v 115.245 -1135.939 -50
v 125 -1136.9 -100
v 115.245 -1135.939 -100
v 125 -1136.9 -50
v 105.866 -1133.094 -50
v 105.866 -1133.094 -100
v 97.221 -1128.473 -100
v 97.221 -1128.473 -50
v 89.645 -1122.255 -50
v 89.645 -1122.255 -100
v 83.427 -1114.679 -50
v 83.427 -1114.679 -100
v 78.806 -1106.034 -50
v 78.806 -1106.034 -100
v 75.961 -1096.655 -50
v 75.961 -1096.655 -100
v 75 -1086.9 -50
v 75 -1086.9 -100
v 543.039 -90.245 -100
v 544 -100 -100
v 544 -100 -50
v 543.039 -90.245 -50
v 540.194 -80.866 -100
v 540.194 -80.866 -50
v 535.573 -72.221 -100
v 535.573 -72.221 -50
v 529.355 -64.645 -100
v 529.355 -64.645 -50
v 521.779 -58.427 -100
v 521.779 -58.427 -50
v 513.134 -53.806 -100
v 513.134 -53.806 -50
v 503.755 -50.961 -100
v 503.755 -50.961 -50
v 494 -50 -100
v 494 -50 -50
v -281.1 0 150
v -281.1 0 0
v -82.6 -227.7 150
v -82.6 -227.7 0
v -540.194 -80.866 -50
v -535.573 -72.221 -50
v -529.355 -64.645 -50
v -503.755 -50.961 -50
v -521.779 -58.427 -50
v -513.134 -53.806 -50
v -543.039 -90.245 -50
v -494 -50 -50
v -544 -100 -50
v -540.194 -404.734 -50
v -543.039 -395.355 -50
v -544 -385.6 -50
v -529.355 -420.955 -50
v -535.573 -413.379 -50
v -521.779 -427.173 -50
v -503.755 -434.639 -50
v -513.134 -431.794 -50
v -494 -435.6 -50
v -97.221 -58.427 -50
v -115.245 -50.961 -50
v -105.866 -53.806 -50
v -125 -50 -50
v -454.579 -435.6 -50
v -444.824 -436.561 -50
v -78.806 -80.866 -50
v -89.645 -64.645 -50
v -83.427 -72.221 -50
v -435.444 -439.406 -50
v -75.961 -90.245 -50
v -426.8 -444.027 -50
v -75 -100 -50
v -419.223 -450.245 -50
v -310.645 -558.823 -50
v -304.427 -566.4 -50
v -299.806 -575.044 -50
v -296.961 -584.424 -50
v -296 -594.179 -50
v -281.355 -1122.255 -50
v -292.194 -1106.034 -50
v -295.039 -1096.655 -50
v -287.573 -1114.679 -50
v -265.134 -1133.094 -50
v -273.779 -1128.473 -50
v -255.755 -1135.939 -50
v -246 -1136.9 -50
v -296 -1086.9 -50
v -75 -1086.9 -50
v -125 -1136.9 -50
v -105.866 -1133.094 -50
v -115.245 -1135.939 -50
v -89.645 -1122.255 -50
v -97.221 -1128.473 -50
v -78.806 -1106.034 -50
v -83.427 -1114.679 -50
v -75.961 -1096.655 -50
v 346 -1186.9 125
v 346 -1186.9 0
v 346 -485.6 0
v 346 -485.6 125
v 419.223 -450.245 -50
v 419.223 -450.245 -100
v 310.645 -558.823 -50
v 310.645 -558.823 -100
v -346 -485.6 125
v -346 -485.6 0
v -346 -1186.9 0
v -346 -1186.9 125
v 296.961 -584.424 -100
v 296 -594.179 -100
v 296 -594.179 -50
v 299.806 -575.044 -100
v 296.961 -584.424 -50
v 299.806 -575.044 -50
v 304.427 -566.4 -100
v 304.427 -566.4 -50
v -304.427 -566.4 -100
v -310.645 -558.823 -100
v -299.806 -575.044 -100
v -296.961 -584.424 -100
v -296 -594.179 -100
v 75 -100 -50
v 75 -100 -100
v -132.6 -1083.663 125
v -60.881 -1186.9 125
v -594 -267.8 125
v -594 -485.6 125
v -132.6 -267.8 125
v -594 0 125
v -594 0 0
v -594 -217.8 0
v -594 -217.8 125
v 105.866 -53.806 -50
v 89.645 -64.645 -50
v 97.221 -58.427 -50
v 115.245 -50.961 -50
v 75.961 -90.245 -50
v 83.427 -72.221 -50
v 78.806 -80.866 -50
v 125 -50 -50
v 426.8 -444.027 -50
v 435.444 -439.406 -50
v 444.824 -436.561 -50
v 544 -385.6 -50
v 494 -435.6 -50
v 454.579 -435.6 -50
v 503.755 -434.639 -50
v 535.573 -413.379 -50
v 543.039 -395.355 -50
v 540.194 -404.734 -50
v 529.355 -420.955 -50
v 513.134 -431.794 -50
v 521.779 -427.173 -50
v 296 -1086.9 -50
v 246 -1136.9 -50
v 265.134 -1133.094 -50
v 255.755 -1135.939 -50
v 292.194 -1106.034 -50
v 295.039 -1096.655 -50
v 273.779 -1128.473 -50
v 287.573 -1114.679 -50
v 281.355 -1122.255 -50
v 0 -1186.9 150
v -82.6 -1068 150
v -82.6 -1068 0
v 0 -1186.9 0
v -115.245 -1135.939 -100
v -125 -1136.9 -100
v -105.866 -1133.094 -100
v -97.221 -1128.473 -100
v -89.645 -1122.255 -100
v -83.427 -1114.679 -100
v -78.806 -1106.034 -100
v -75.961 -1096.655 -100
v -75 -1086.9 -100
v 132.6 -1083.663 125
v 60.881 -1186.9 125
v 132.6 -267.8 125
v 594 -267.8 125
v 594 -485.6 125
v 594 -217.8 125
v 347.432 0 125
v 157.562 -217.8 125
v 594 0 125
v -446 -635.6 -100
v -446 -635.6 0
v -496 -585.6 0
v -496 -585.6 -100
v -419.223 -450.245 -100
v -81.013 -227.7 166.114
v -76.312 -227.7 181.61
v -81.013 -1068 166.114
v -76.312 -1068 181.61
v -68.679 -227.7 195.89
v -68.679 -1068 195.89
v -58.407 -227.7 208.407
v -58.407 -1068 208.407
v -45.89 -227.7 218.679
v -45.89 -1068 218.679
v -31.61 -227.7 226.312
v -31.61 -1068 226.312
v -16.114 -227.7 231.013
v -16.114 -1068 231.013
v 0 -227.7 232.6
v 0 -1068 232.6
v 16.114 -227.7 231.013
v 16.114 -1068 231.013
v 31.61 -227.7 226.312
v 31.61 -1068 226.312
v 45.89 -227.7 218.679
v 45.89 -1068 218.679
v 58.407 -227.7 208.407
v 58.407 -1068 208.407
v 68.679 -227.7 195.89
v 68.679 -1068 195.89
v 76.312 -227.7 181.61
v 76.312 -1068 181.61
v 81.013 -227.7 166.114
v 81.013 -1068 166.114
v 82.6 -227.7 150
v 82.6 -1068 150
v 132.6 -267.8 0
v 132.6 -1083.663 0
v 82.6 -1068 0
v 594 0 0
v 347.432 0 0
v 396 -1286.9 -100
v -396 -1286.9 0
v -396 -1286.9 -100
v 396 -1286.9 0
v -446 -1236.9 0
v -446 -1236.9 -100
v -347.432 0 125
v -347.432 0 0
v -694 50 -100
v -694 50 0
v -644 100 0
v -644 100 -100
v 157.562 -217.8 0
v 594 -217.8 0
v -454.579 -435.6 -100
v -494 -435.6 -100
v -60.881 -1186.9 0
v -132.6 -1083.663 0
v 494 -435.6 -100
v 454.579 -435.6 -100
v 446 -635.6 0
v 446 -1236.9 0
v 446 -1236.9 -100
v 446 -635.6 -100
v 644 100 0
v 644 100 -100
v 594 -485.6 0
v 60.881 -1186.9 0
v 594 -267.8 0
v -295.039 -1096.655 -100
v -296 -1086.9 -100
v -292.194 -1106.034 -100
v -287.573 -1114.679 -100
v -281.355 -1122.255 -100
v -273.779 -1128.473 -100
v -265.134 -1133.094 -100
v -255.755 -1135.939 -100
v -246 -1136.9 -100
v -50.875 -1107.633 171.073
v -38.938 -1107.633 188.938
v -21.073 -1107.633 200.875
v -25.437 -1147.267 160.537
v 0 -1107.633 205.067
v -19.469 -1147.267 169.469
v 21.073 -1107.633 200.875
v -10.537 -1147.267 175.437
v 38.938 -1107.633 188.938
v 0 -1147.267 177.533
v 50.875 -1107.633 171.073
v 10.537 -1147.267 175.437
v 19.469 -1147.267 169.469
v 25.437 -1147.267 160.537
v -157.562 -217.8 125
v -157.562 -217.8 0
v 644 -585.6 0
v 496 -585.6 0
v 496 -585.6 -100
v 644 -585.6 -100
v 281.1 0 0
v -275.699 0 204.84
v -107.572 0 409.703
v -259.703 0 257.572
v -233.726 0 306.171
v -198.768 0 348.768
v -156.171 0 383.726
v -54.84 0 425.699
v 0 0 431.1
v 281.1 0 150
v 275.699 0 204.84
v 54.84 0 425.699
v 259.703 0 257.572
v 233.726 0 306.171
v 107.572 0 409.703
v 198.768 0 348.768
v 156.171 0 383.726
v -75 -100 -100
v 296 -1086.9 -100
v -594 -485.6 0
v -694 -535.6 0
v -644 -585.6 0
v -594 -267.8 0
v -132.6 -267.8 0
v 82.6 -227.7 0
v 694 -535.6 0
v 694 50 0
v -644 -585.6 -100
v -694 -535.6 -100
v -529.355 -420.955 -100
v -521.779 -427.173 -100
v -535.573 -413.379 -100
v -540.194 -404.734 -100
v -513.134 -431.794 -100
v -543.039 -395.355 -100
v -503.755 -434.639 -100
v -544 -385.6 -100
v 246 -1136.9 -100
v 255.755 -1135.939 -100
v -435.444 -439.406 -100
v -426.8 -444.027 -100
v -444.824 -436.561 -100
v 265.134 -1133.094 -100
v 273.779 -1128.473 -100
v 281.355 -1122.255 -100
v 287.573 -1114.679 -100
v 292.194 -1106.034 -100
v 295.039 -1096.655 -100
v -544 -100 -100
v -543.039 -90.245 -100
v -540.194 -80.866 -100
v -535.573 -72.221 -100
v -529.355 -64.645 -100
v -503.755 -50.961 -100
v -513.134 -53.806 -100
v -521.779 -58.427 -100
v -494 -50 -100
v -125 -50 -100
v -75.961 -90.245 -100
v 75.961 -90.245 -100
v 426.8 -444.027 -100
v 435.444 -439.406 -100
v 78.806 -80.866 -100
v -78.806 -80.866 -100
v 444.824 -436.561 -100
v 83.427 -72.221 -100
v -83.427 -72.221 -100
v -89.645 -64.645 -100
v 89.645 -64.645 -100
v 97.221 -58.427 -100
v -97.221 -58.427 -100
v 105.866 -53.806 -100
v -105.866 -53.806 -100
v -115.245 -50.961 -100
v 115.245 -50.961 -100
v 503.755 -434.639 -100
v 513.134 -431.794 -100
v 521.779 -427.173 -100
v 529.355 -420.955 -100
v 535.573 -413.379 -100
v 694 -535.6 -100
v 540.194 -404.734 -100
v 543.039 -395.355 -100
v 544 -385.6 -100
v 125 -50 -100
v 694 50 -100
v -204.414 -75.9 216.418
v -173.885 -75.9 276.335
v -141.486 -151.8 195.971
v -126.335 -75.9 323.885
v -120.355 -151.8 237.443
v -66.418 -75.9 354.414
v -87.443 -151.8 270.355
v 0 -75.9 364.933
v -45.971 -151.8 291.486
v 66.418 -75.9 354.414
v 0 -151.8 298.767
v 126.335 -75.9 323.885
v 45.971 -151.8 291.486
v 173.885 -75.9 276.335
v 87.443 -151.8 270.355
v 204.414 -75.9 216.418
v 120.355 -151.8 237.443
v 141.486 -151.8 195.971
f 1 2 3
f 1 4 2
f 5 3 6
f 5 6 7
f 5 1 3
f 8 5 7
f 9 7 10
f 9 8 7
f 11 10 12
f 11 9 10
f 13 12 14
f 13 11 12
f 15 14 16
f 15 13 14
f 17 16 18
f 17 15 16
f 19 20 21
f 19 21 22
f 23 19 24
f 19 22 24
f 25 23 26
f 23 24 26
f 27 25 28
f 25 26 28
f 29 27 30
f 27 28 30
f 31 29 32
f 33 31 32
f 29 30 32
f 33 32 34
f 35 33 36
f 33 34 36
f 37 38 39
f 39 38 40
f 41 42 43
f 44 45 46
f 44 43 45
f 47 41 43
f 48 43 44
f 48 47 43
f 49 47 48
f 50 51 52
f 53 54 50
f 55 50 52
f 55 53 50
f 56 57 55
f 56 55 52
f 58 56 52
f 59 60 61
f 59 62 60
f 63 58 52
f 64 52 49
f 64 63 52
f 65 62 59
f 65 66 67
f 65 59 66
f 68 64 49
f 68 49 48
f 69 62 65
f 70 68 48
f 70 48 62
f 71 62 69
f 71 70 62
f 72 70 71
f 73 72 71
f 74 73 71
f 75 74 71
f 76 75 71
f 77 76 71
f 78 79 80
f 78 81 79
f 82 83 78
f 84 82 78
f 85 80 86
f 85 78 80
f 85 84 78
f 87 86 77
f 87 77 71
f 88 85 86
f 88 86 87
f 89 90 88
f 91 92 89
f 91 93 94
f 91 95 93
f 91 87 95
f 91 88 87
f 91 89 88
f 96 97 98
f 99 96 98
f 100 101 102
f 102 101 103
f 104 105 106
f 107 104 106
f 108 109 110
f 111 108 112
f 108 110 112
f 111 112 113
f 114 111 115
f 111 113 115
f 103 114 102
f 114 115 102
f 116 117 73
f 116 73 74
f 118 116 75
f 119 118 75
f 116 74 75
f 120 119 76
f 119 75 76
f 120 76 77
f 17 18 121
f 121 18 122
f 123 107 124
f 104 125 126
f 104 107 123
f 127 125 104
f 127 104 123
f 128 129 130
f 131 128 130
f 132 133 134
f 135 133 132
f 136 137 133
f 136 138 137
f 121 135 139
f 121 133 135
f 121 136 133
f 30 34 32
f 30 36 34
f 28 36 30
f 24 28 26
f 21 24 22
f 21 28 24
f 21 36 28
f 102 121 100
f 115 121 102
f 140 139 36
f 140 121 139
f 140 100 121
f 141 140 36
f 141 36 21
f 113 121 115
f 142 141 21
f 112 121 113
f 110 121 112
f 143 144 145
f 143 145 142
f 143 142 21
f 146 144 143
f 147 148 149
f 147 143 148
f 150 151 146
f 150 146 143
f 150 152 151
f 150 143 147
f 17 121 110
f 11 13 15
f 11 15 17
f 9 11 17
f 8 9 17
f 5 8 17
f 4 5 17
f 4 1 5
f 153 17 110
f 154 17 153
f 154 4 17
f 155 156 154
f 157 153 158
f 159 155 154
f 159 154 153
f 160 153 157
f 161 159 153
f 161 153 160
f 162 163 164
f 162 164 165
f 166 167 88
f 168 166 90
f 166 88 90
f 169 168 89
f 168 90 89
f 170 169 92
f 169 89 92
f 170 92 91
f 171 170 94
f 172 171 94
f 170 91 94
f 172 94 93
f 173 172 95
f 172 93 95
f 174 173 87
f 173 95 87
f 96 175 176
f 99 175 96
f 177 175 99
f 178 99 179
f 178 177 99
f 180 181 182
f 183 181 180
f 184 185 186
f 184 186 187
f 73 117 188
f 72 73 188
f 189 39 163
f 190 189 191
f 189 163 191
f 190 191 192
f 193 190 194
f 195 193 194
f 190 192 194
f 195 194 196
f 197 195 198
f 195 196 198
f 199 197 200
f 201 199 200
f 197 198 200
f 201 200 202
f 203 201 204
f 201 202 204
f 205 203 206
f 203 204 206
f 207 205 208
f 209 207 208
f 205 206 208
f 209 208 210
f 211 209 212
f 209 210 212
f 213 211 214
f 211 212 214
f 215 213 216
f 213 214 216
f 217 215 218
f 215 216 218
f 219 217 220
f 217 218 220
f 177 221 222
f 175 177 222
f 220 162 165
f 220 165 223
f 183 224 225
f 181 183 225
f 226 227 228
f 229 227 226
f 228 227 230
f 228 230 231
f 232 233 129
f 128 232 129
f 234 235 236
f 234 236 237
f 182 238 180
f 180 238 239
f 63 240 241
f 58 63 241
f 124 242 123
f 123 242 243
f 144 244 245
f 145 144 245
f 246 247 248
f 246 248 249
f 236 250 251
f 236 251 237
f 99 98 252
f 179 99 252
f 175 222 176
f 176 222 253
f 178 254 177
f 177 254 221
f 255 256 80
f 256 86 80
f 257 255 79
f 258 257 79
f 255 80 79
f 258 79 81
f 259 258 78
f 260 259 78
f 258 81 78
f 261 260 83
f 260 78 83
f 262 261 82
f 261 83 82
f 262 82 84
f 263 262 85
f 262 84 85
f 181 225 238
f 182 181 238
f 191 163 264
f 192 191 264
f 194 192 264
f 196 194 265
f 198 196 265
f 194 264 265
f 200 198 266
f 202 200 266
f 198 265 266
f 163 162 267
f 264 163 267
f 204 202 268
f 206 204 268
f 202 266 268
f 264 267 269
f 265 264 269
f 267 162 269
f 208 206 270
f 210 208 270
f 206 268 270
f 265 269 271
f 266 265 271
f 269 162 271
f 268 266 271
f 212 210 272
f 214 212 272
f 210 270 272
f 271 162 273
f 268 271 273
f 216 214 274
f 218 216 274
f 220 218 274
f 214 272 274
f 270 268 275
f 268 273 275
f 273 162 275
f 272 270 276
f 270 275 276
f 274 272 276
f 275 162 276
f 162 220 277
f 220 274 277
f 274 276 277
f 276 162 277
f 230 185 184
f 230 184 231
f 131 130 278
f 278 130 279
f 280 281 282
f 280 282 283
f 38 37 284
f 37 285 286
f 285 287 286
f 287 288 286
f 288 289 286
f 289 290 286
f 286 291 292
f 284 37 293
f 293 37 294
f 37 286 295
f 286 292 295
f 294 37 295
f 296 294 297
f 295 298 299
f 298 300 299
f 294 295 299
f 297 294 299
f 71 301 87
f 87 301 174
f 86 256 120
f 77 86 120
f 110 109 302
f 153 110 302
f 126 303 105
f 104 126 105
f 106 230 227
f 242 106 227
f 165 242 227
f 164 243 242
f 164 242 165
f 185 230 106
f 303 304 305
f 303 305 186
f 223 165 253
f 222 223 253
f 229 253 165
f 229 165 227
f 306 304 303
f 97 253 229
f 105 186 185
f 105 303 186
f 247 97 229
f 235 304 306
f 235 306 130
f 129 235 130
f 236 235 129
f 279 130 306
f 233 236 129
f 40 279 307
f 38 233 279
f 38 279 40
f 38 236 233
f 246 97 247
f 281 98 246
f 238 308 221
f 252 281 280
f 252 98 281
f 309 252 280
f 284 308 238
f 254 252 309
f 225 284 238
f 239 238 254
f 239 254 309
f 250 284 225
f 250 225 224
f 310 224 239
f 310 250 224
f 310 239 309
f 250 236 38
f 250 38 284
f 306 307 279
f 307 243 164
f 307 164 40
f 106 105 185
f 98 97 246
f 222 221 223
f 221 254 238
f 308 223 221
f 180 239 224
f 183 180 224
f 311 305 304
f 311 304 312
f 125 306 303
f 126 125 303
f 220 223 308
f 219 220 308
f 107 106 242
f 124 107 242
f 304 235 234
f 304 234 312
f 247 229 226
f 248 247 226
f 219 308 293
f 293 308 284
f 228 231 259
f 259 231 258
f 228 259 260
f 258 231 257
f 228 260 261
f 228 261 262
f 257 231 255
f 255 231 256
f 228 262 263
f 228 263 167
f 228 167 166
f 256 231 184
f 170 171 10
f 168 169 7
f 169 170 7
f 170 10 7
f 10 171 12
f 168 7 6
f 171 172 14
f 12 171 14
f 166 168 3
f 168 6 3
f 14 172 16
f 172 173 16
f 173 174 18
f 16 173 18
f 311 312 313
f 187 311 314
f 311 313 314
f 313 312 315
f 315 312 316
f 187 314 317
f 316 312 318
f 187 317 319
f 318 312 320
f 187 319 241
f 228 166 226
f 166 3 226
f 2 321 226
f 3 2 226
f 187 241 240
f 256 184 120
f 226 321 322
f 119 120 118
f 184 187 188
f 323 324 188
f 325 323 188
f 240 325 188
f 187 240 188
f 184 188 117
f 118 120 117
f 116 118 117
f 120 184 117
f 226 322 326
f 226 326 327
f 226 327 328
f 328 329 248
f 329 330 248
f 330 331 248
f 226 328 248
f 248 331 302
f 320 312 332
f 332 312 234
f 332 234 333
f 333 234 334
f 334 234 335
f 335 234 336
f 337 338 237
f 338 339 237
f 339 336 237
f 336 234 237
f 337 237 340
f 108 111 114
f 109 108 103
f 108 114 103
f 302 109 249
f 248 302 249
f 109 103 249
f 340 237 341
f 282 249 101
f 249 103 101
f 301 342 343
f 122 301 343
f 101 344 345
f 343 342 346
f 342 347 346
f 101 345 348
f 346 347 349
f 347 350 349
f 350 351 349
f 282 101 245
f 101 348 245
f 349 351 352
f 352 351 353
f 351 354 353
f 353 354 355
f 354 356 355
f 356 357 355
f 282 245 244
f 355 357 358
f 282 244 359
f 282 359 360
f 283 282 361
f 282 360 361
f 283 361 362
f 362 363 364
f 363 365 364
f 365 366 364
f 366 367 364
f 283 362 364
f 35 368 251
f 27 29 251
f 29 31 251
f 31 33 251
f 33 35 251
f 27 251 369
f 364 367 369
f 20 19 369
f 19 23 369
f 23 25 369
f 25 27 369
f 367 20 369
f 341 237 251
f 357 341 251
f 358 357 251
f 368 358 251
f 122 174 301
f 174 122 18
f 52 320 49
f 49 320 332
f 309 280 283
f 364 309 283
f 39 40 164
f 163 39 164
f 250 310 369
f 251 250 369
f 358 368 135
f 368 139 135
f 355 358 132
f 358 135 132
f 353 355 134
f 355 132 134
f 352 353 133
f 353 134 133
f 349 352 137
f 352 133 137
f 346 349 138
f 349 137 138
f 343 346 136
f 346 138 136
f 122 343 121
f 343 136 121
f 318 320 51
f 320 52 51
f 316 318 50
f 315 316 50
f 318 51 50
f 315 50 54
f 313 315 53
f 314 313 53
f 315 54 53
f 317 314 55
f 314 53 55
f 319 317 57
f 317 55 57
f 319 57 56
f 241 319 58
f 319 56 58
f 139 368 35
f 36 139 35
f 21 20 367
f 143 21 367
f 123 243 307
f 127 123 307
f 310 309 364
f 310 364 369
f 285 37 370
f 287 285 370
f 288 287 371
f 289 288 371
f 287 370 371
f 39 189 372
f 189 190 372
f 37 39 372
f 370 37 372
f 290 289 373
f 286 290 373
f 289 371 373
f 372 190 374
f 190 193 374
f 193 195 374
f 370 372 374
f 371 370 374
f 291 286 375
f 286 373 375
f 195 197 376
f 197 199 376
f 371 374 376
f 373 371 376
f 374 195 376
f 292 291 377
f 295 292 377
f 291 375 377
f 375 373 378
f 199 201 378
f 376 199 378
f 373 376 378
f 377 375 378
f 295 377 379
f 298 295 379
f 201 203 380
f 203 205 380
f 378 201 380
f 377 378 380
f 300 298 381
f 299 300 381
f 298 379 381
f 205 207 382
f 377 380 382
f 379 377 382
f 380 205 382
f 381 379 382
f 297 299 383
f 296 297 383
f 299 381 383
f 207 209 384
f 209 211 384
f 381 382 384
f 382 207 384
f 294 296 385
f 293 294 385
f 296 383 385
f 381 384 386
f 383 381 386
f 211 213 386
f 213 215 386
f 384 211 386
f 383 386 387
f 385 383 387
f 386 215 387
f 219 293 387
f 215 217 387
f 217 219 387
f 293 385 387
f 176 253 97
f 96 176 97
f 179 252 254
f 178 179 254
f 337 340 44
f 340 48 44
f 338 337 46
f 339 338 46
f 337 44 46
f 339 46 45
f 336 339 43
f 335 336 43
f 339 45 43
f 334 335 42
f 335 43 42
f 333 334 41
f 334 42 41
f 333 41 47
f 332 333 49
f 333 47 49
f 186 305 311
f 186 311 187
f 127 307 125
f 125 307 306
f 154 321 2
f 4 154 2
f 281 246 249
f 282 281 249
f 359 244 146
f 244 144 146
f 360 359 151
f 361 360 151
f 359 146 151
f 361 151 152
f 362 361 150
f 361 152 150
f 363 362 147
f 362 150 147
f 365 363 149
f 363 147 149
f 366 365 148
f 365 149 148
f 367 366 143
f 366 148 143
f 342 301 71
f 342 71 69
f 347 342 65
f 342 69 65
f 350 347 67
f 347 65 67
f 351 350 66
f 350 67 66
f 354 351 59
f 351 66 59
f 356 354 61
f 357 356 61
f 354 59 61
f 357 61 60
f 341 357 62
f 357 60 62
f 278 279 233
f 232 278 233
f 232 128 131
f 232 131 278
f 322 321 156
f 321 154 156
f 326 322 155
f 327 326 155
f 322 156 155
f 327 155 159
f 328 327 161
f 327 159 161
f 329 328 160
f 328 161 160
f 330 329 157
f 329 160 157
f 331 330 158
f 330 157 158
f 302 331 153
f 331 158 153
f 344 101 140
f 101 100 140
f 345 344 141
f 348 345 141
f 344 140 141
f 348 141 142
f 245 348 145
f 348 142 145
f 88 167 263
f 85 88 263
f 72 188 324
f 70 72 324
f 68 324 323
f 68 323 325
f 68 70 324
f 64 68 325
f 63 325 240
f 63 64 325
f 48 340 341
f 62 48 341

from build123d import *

# Parameters (mm, degrees)
F1_DEPTH = 100
F2_DEPTH = 125
F3_DEPTH = 150
F5_ANGLE = 180
F6_SIZE  = 50
F8_DEPTH = 50
F9_R     = 50


with BuildPart() as f1:
    # F0 (on Top) → F1 (new body)
    with BuildSketch(Plane.XY):
        Polygon((694, 100), (0, 100), (-694, 100), (-694, -585.6), (-446, -585.6), (-446, -1286.9), (0, -1286.9), (446, -1286.9), (446, -585.6), (694, -585.6), align=None)
        Polygon((-594, -485.6), (-594, -267.8), (-132.6, -267.8), (-132.6, -1083.6631870207), (-60.8812384181, -1186.9), (-346, -1186.9), (-346, -485.6), align=None, mode=Mode.SUBTRACT)
        Polygon((132.6, -267.8), (594, -267.8), (594, -485.6), (346, -485.6), (346, -1186.9), (60.8812384181, -1186.9), (132.6, -1083.6631870207), align=None, mode=Mode.SUBTRACT)
        Polygon((-281.1, 0), (0, 0), (281.1, 0), (82.6, -227.7), (82.6, -1068), (0, -1186.9), (-82.6, -1068), (-82.6, -227.7), align=None, mode=Mode.SUBTRACT)
        Polygon((-594, -217.8), (-594, 0), (-347.4318814101, 0), (-157.5623161927, -217.8), align=None, mode=Mode.SUBTRACT)
        Polygon((594, -217.8), (157.5623161927, -217.8), (347.4318814101, 0), (594, 0), align=None, mode=Mode.SUBTRACT)
        Polygon((-347.4318814101, 0), (-594, 0), (-594, -217.8), (-157.5623161927, -217.8), align=None)
        Polygon((-132.6, -267.8), (-594, -267.8), (-594, -485.6), (-346, -485.6), (-346, -1186.9), (-60.8812384181, -1186.9), (-132.6, -1083.6631870207), align=None)
        Polygon((281.1, 0), (0, 0), (0, -1186.9), (82.6, -1068), (82.6, -227.7), align=None)
        Polygon((594, -485.6), (594, -267.8), (132.6, -267.8), (132.6, -1083.6631870207), (60.8812384181, -1186.9), (346, -1186.9), (346, -485.6), align=None)
        Polygon((347.4318814101, 0), (157.5623161927, -217.8), (594, -217.8), (594, 0), align=None)
        Polygon((0, -1186.9), (0, 0), (-281.1, 0), (-82.6, -227.7), (-82.6, -1068), align=None)
    extrude(amount=-F1_DEPTH)

    # F0 (on Top) → F2 (join)
    with BuildSketch(Plane.XY):
        Polygon((-347.4318814101, 0), (-594, 0), (-594, -217.8), (-157.5623161927, -217.8), align=None)
        Polygon((-132.6, -267.8), (-594, -267.8), (-594, -485.6), (-346, -485.6), (-346, -1186.9), (-60.8812384181, -1186.9), (-132.6, -1083.6631870207), align=None)
        Polygon((594, -485.6), (594, -267.8), (132.6, -267.8), (132.6, -1083.6631870207), (60.8812384181, -1186.9), (346, -1186.9), (346, -485.6), align=None)
        Polygon((347.4318814101, 0), (157.5623161927, -217.8), (594, -217.8), (594, 0), align=None)
    extrude(amount=F2_DEPTH)

    # F0 (on Top) → F3 (join)
    with BuildSketch(Plane.XY):
        Polygon((0, -1186.9), (0, 0), (-281.1, 0), (-82.6, -227.7), (-82.6, -1068), align=None)
        Polygon((281.1, 0), (0, 0), (0, -1186.9), (82.6, -1068), (82.6, -227.7), align=None)
    extrude(amount=F3_DEPTH)

    # F4 (on face) → F5 (revolve)
    with BuildSketch(Plane.XY.offset(150)):
        Polygon((0, -1186.9), (0, 0), (-281.1, 0), (-82.6, -227.7), (-82.6, -1068), align=None)
    revolve(axis=Axis((0, -593.45, 150), (0, 1, 0)), revolution_arc=F5_ANGLE)

    # F6
    f6_edges = [f1.edges().sort_by_distance(p)[0] for p in [
        (-694, 100, -50),
        (-694, -585.6, -50),
        (-446, -1286.9, -50),
        (446, -1286.9, -50),
        (-446, -585.6, -50),
        (446, -585.6, -50),
        (694, -585.6, -50),
        (694, 100, -50),
    ]]
    chamfer(f6_edges, length=F6_SIZE)

    # F7 (on face) → F8 (cut)
    with BuildSketch(Plane(origin=(0, 0, -100), x_dir=(1, 0, 0), z_dir=(0, 0, -1))):
        Polygon((-433.867965644, 435.6), (-544, 435.6), (-544, 50), (-75, 50), (-75, 1136.9), (-296, 1136.9), (-296, 573.467965644), align=None)
        Polygon((75, 1136.9), (75, 50), (544, 50), (544, 435.6), (433.867965644, 435.6), (296, 573.467965644), (296, 1136.9), align=None)
    extrude(amount=-F8_DEPTH, mode=Mode.SUBTRACT)

    # F9
    f9_edges = [f1.edges().sort_by_distance(p)[0] for p in [
        (-544, -435.6, -75),
        (-433.867966, -435.6, -75),
        (-296, -573.467966, -75),
        (-296, -1136.9, -75),
        (-75, -1136.9, -75),
        (-75, -50, -75),
        (-544, -50, -75),
        (75, -50, -75),
        (544, -50, -75),
        (544, -435.6, -75),
        (433.867966, -435.6, -75),
        (296, -573.467966, -75),
        (296, -1136.9, -75),
        (75, -1136.9, -75),
    ]]
    fillet(f9_edges, radius=F9_R)


solid = f1.part
